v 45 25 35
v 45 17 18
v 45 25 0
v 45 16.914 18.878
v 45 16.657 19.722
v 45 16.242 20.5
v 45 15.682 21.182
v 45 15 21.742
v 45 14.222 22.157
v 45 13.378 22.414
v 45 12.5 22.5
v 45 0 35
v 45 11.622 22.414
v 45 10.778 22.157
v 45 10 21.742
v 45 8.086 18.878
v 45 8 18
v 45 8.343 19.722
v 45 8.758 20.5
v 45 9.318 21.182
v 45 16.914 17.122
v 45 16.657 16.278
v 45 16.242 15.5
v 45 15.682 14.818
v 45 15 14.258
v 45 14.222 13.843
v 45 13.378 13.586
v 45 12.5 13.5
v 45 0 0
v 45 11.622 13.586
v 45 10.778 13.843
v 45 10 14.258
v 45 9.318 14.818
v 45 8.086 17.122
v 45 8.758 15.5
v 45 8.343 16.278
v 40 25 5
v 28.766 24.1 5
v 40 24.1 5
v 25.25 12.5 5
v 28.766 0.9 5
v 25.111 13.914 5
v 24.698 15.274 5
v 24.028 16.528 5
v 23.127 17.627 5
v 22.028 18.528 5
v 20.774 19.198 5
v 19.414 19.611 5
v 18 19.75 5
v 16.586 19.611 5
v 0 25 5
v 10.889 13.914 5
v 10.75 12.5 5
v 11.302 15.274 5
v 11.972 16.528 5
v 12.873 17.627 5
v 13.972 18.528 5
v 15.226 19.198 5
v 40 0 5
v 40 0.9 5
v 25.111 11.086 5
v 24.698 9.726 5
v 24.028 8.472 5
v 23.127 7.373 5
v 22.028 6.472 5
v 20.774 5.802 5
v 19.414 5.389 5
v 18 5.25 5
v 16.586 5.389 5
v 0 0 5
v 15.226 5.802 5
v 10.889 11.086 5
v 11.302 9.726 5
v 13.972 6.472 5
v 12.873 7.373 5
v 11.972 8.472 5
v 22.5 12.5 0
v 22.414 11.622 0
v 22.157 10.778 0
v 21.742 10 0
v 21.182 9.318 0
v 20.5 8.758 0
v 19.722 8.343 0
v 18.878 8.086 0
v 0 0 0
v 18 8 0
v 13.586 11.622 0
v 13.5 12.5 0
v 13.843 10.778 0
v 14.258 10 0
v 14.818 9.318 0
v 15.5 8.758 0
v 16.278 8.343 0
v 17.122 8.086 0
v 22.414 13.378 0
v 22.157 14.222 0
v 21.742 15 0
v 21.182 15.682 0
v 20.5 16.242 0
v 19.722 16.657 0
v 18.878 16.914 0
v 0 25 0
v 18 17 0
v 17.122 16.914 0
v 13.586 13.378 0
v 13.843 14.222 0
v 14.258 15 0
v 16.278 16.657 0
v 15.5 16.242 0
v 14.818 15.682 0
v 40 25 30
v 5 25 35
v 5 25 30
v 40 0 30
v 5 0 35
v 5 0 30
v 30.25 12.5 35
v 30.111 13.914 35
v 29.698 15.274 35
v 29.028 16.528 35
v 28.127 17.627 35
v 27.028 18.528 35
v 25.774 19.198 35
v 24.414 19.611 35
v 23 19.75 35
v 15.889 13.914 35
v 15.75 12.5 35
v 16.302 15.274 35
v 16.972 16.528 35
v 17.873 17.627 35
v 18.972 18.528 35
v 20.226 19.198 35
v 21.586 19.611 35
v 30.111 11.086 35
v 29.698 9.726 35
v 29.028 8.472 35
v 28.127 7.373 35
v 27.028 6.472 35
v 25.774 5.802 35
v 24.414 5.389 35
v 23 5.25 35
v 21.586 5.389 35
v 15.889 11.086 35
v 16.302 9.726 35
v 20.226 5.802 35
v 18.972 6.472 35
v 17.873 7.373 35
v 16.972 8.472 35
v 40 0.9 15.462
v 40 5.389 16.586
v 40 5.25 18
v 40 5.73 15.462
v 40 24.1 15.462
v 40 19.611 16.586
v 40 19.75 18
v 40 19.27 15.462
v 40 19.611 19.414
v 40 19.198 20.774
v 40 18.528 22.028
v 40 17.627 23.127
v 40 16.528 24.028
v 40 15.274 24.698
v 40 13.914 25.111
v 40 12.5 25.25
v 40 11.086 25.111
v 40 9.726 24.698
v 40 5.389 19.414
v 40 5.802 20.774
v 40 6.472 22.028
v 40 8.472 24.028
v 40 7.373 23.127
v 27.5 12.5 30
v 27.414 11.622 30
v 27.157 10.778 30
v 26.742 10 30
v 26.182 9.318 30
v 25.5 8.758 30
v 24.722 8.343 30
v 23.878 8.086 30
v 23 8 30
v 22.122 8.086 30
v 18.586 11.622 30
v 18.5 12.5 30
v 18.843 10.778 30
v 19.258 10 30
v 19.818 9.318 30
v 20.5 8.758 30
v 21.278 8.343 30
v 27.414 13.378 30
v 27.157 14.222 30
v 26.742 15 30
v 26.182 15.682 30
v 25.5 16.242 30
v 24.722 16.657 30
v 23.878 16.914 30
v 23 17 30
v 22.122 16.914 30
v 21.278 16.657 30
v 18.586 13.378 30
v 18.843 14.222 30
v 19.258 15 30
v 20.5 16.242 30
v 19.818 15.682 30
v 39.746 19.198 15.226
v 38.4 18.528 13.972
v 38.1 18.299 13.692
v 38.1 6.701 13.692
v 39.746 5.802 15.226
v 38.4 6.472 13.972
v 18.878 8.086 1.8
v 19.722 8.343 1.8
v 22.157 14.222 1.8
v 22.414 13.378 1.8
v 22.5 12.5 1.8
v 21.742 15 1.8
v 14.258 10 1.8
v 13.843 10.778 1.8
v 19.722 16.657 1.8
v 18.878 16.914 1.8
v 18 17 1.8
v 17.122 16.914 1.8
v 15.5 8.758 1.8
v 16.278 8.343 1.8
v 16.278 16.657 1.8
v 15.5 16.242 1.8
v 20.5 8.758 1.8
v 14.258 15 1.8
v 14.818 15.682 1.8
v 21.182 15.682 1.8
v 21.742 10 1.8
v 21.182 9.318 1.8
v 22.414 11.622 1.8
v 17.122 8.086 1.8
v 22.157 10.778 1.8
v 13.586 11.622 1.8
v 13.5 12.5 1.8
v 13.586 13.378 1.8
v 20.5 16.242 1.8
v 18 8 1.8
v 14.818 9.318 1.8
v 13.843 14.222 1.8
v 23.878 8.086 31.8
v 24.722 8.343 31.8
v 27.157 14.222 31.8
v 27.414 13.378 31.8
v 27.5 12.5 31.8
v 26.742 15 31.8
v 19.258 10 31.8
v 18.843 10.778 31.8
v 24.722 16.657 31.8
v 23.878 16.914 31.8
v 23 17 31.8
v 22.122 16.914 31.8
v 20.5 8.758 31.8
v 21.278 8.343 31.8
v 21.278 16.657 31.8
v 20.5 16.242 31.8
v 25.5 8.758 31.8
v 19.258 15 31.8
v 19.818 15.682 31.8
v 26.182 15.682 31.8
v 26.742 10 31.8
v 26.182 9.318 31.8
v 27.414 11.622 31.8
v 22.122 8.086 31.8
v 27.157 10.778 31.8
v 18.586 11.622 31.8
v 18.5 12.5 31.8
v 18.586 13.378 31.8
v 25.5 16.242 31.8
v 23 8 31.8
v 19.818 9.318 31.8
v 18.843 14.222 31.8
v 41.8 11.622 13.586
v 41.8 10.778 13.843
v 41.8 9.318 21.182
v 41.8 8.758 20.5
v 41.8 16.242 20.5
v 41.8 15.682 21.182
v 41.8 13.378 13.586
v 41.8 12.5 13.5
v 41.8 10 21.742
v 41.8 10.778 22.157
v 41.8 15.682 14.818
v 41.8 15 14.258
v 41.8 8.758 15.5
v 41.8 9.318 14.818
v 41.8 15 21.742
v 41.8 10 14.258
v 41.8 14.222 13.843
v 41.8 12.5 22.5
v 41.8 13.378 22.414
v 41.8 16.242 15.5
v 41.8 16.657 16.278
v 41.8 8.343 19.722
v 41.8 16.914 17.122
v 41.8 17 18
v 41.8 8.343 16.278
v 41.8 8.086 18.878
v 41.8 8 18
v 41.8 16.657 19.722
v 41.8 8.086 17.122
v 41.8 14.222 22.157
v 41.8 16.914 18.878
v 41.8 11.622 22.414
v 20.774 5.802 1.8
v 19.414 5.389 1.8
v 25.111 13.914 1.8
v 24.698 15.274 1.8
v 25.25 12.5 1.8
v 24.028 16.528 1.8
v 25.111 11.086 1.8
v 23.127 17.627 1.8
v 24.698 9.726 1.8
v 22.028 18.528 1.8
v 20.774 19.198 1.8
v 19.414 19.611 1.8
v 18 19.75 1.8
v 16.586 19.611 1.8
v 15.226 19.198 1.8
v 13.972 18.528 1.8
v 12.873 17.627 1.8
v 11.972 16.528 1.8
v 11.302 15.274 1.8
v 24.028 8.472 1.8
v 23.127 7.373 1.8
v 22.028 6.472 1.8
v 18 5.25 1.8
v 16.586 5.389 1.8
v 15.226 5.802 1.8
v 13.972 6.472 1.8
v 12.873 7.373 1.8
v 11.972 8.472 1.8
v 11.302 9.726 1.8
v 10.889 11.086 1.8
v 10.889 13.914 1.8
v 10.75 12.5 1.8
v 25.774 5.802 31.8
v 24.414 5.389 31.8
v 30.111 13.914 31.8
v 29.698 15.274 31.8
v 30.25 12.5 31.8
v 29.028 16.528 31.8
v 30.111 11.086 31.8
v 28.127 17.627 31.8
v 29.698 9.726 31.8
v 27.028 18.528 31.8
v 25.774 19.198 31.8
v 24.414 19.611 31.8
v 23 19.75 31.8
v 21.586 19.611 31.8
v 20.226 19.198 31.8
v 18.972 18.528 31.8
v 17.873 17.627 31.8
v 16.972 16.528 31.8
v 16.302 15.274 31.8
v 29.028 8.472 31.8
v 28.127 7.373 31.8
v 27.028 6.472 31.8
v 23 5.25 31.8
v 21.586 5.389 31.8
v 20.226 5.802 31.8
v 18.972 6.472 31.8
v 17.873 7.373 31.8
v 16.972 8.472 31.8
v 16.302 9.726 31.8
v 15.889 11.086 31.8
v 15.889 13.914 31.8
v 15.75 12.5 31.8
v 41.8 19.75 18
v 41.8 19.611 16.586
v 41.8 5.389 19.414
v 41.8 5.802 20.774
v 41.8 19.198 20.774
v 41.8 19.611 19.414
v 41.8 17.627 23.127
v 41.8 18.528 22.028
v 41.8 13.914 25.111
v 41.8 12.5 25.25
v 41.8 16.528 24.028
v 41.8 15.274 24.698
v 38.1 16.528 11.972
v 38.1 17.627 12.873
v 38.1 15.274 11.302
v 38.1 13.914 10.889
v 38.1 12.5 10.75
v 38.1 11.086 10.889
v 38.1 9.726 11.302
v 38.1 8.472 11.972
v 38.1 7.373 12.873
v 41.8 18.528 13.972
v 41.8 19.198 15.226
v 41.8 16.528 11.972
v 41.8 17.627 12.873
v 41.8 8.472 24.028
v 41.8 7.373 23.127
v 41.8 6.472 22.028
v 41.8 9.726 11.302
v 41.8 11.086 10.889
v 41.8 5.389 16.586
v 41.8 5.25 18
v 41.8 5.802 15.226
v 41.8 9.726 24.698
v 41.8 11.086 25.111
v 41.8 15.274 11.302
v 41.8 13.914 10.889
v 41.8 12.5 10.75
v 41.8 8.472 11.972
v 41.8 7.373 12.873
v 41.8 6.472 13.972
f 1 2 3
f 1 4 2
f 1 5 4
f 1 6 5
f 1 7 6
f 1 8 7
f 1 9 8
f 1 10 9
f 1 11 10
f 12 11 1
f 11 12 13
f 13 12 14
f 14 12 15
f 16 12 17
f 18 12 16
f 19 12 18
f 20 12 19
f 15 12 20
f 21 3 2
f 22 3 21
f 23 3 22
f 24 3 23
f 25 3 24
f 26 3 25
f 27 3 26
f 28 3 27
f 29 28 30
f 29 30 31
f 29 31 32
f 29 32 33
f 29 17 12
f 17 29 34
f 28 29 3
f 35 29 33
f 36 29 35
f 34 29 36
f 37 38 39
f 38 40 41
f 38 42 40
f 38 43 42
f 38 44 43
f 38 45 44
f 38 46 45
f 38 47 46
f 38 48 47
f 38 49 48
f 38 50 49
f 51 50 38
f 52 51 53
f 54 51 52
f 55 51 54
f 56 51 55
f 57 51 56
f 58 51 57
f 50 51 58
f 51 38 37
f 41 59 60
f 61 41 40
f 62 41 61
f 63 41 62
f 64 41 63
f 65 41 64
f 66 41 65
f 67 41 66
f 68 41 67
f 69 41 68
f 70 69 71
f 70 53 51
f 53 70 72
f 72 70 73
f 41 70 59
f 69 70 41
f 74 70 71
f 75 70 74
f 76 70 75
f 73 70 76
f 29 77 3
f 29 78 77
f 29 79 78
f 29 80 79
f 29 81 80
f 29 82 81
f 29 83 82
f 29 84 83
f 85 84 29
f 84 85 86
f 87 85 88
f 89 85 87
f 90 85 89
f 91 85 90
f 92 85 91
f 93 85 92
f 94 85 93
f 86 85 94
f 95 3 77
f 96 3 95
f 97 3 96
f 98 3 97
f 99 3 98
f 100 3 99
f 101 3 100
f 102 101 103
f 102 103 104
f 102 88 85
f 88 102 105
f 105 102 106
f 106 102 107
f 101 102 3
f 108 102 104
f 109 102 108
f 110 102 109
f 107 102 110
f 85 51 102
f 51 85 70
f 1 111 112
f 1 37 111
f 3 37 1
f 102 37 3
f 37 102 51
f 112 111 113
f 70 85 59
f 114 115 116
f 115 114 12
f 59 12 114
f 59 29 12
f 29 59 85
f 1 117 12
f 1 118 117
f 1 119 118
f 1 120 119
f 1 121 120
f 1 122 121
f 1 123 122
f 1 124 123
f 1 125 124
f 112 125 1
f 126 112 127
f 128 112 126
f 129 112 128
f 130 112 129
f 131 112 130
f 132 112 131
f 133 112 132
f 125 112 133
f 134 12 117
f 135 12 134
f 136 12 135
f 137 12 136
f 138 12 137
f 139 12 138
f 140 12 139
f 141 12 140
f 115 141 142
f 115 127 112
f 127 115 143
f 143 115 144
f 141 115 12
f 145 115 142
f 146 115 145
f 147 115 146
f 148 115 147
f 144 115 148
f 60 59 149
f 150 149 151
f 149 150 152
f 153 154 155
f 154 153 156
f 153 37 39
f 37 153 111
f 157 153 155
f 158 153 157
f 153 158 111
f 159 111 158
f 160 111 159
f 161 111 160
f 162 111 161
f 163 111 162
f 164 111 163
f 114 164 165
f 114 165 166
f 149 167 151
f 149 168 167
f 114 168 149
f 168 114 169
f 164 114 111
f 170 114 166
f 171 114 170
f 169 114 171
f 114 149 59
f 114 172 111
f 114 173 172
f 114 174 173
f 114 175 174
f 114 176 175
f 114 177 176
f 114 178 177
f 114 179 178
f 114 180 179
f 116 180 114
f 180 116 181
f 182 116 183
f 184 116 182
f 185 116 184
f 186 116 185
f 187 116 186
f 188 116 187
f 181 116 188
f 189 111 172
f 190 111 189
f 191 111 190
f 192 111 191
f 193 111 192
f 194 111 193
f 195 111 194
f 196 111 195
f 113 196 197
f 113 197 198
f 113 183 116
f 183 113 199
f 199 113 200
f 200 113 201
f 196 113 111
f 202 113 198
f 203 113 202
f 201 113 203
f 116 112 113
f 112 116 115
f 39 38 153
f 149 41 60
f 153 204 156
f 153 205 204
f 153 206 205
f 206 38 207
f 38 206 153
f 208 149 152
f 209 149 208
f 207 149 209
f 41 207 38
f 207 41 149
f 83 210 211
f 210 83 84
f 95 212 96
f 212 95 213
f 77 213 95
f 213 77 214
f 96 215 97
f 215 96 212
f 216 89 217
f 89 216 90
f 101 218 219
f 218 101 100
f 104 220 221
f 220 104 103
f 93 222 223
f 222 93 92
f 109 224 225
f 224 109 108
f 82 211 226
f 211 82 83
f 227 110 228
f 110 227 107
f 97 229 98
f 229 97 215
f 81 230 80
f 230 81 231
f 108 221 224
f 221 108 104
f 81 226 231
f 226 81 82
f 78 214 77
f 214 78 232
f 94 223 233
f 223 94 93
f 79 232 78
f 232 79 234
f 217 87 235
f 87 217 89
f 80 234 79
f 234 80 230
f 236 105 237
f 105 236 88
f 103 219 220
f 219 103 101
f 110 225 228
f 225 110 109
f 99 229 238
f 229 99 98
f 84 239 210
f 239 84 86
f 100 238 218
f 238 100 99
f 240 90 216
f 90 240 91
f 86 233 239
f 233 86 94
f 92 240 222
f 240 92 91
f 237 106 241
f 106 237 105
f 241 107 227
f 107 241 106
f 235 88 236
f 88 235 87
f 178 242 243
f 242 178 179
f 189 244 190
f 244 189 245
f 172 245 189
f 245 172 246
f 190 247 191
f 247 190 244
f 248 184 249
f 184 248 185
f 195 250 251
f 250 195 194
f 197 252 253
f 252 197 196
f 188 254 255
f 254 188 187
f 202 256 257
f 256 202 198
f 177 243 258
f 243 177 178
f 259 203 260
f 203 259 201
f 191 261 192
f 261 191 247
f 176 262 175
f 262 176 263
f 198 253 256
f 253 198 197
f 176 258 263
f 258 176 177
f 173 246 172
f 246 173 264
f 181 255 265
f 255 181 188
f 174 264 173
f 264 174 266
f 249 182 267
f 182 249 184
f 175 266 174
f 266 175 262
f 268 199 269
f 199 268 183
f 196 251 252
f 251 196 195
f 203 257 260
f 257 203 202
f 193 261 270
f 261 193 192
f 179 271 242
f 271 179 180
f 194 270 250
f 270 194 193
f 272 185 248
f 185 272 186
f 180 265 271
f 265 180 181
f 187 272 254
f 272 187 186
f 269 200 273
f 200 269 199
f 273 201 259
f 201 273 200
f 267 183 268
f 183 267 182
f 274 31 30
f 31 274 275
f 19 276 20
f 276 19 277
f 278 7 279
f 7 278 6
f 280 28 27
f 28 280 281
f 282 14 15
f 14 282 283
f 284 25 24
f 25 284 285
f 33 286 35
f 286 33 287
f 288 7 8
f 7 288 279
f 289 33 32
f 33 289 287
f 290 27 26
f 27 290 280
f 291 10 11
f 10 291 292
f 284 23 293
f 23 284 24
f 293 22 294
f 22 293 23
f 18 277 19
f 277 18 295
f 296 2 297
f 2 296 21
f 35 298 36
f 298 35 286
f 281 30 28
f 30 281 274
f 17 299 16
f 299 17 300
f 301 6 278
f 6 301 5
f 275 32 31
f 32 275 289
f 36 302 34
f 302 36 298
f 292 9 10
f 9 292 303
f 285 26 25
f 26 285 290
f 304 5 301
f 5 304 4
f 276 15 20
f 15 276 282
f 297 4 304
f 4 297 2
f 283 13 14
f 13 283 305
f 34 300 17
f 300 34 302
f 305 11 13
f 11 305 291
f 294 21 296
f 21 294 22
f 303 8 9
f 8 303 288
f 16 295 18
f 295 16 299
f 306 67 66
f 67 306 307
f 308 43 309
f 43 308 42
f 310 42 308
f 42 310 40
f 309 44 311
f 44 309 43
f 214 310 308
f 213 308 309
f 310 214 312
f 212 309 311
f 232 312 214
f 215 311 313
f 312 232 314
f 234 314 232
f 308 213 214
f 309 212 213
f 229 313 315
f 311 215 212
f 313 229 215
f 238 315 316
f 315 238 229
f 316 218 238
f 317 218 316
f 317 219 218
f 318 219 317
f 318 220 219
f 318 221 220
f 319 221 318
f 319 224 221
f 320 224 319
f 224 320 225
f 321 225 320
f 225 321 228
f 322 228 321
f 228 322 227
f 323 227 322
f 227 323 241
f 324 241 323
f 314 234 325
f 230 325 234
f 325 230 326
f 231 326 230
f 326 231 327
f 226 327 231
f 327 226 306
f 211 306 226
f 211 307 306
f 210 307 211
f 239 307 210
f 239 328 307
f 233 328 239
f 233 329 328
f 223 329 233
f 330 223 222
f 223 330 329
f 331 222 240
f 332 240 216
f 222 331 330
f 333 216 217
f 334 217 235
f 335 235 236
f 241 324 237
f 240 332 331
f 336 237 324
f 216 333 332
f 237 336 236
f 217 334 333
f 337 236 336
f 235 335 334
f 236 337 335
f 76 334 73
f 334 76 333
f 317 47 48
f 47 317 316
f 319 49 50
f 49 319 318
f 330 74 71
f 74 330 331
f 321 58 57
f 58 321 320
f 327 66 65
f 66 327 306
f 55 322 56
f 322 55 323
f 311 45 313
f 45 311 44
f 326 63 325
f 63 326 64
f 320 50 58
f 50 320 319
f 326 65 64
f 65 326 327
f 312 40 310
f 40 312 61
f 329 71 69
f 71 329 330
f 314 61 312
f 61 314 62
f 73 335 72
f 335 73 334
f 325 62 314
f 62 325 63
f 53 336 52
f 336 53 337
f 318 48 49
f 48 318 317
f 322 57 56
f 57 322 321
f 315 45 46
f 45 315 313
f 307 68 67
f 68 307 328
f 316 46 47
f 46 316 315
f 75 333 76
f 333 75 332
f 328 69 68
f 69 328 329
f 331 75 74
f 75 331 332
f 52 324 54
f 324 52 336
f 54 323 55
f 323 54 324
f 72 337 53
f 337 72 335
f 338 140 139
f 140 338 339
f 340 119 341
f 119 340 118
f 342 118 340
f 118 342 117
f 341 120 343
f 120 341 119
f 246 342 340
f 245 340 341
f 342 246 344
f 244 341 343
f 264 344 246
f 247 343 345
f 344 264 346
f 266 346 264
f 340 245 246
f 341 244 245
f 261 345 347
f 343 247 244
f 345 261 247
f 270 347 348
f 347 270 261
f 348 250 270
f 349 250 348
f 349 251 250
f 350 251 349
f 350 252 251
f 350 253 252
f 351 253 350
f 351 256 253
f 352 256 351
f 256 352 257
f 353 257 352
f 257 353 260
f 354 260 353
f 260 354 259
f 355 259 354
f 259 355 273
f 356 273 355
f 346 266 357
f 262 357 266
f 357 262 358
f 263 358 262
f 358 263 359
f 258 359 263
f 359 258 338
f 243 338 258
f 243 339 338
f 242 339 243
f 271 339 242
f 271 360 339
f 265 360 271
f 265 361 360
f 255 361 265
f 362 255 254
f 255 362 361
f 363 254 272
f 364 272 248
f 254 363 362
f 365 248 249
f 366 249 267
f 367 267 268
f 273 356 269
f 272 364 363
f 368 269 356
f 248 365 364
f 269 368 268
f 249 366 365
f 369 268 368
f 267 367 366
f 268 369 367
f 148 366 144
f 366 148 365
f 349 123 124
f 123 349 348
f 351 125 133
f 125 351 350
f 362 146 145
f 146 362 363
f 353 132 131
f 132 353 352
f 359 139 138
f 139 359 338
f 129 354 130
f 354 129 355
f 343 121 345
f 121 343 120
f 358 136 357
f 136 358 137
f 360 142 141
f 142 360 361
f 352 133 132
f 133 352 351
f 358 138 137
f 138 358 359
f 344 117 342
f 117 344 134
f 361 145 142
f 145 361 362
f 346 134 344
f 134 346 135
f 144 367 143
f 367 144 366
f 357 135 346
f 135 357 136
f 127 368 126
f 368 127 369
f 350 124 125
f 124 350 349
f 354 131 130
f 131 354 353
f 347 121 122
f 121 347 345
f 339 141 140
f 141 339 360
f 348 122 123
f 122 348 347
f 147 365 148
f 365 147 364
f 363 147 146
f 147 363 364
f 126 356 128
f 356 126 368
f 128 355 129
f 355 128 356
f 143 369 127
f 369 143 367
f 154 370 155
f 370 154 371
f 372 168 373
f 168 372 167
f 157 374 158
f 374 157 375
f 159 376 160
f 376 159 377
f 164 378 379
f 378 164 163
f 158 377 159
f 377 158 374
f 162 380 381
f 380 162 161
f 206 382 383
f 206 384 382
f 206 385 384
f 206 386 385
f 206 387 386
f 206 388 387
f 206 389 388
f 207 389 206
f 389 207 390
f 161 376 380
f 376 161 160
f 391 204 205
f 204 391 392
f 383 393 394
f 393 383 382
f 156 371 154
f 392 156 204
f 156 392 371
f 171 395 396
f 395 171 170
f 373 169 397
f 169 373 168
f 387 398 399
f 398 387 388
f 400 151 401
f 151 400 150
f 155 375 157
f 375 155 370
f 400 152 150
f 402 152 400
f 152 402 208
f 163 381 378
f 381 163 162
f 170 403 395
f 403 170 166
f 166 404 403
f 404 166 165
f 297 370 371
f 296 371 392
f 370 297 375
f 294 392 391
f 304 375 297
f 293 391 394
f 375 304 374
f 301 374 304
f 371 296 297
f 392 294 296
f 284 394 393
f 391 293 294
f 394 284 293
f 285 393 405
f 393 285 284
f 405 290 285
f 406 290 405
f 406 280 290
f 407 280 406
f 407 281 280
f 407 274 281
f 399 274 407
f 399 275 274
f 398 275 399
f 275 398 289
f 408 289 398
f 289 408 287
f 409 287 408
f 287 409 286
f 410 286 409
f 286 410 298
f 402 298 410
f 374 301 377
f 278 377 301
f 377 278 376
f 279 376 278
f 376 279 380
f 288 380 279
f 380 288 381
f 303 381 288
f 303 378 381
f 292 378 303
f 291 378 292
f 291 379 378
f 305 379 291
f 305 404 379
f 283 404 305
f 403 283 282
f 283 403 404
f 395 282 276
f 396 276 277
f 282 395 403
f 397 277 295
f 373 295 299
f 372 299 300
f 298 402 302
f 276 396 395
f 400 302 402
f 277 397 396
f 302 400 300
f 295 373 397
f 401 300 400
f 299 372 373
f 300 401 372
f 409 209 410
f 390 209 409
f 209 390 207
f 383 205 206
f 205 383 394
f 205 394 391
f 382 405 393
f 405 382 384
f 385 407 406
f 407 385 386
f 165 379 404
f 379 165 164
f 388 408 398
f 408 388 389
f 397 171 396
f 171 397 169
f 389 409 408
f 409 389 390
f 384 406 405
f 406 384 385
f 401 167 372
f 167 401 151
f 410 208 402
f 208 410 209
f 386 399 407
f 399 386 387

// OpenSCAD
$fn = 32;

// ----------------------------------------------------------------------
// Z-bracket: 45 x 25 x 35 mm
// ----------------------------------------------------------------------

// --- parameters (mm) ---
lower_leg = 45;           // lower foot length, X
upper_leg = 35;           // upper foot length, X
bracket_w = 25;           // bracket width, Y
offset_h = 35;            // overall rise, Z
sheet_t = 5;              // plate thickness
hole_d = 9;               // clearance for M8
cb_d = 14.5;              // counterbore diameter
cb_h = 3.2;               // counterbore depth
rib_len = 12.2;           // gusset leg
rib_sink = 0.9;           // gusset overlap into the plates

module hole_z(px, py, z0) {
  translate([px, py, z0 - 0.5]) cylinder(h = sheet_t + 1, d = hole_d);
}
module hole_x(py, pz) {
  translate([-0.5, py, pz]) rotate([0, 90, 0]) cylinder(h = sheet_t + 1, d = hole_d);
}
module cb_z(px, py, top_z) {
  translate([px, py, top_z - cb_h]) cylinder(h = cb_h + 0.5, d = cb_d);
}
module cb_x(py, pz) {
  translate([sheet_t - cb_h, py, pz]) rotate([0, -90, 0]) cylinder(h = cb_h + 0.5, d = cb_d);
}
module gusset(x0) {
  translate([x0, bracket_w - rib_sink, 0])
    rotate([90, 0, 0])
      linear_extrude(height = bracket_w - 2 * rib_sink)
        polygon(points = [[rib_sink, sheet_t - rib_sink],
                          [rib_sink, sheet_t - rib_sink + rib_len],
                          [-rib_len, sheet_t - rib_sink]]);
}

difference() {
  union() {
    cube([lower_leg, bracket_w, sheet_t]);
    /* web, overlapping the lower foot */
    translate([lower_leg - sheet_t, 0, 0]) cube([sheet_t, bracket_w, offset_h]);
    /* upper foot, sunk into the web */
    translate([lower_leg - sheet_t - upper_leg, 0, offset_h - sheet_t]) cube([upper_leg + sheet_t, bracket_w, sheet_t]);
    gusset(lower_leg - sheet_t);
  }
  hole_z(18, 12.5, 0);
  translate([lower_leg - sheet_t - 17, 0, 0]) hole_z(0, 12.5, offset_h - sheet_t);
  translate([lower_leg - sheet_t, 0, 0]) hole_x(12.5, 18);
  cb_z(18, 12.5, sheet_t);
  translate([lower_leg - sheet_t - 17, 0, 0]) cb_z(0, 12.5, offset_h);
  translate([lower_leg - sheet_t, 0, 0]) cb_x(12.5, 18);
}
